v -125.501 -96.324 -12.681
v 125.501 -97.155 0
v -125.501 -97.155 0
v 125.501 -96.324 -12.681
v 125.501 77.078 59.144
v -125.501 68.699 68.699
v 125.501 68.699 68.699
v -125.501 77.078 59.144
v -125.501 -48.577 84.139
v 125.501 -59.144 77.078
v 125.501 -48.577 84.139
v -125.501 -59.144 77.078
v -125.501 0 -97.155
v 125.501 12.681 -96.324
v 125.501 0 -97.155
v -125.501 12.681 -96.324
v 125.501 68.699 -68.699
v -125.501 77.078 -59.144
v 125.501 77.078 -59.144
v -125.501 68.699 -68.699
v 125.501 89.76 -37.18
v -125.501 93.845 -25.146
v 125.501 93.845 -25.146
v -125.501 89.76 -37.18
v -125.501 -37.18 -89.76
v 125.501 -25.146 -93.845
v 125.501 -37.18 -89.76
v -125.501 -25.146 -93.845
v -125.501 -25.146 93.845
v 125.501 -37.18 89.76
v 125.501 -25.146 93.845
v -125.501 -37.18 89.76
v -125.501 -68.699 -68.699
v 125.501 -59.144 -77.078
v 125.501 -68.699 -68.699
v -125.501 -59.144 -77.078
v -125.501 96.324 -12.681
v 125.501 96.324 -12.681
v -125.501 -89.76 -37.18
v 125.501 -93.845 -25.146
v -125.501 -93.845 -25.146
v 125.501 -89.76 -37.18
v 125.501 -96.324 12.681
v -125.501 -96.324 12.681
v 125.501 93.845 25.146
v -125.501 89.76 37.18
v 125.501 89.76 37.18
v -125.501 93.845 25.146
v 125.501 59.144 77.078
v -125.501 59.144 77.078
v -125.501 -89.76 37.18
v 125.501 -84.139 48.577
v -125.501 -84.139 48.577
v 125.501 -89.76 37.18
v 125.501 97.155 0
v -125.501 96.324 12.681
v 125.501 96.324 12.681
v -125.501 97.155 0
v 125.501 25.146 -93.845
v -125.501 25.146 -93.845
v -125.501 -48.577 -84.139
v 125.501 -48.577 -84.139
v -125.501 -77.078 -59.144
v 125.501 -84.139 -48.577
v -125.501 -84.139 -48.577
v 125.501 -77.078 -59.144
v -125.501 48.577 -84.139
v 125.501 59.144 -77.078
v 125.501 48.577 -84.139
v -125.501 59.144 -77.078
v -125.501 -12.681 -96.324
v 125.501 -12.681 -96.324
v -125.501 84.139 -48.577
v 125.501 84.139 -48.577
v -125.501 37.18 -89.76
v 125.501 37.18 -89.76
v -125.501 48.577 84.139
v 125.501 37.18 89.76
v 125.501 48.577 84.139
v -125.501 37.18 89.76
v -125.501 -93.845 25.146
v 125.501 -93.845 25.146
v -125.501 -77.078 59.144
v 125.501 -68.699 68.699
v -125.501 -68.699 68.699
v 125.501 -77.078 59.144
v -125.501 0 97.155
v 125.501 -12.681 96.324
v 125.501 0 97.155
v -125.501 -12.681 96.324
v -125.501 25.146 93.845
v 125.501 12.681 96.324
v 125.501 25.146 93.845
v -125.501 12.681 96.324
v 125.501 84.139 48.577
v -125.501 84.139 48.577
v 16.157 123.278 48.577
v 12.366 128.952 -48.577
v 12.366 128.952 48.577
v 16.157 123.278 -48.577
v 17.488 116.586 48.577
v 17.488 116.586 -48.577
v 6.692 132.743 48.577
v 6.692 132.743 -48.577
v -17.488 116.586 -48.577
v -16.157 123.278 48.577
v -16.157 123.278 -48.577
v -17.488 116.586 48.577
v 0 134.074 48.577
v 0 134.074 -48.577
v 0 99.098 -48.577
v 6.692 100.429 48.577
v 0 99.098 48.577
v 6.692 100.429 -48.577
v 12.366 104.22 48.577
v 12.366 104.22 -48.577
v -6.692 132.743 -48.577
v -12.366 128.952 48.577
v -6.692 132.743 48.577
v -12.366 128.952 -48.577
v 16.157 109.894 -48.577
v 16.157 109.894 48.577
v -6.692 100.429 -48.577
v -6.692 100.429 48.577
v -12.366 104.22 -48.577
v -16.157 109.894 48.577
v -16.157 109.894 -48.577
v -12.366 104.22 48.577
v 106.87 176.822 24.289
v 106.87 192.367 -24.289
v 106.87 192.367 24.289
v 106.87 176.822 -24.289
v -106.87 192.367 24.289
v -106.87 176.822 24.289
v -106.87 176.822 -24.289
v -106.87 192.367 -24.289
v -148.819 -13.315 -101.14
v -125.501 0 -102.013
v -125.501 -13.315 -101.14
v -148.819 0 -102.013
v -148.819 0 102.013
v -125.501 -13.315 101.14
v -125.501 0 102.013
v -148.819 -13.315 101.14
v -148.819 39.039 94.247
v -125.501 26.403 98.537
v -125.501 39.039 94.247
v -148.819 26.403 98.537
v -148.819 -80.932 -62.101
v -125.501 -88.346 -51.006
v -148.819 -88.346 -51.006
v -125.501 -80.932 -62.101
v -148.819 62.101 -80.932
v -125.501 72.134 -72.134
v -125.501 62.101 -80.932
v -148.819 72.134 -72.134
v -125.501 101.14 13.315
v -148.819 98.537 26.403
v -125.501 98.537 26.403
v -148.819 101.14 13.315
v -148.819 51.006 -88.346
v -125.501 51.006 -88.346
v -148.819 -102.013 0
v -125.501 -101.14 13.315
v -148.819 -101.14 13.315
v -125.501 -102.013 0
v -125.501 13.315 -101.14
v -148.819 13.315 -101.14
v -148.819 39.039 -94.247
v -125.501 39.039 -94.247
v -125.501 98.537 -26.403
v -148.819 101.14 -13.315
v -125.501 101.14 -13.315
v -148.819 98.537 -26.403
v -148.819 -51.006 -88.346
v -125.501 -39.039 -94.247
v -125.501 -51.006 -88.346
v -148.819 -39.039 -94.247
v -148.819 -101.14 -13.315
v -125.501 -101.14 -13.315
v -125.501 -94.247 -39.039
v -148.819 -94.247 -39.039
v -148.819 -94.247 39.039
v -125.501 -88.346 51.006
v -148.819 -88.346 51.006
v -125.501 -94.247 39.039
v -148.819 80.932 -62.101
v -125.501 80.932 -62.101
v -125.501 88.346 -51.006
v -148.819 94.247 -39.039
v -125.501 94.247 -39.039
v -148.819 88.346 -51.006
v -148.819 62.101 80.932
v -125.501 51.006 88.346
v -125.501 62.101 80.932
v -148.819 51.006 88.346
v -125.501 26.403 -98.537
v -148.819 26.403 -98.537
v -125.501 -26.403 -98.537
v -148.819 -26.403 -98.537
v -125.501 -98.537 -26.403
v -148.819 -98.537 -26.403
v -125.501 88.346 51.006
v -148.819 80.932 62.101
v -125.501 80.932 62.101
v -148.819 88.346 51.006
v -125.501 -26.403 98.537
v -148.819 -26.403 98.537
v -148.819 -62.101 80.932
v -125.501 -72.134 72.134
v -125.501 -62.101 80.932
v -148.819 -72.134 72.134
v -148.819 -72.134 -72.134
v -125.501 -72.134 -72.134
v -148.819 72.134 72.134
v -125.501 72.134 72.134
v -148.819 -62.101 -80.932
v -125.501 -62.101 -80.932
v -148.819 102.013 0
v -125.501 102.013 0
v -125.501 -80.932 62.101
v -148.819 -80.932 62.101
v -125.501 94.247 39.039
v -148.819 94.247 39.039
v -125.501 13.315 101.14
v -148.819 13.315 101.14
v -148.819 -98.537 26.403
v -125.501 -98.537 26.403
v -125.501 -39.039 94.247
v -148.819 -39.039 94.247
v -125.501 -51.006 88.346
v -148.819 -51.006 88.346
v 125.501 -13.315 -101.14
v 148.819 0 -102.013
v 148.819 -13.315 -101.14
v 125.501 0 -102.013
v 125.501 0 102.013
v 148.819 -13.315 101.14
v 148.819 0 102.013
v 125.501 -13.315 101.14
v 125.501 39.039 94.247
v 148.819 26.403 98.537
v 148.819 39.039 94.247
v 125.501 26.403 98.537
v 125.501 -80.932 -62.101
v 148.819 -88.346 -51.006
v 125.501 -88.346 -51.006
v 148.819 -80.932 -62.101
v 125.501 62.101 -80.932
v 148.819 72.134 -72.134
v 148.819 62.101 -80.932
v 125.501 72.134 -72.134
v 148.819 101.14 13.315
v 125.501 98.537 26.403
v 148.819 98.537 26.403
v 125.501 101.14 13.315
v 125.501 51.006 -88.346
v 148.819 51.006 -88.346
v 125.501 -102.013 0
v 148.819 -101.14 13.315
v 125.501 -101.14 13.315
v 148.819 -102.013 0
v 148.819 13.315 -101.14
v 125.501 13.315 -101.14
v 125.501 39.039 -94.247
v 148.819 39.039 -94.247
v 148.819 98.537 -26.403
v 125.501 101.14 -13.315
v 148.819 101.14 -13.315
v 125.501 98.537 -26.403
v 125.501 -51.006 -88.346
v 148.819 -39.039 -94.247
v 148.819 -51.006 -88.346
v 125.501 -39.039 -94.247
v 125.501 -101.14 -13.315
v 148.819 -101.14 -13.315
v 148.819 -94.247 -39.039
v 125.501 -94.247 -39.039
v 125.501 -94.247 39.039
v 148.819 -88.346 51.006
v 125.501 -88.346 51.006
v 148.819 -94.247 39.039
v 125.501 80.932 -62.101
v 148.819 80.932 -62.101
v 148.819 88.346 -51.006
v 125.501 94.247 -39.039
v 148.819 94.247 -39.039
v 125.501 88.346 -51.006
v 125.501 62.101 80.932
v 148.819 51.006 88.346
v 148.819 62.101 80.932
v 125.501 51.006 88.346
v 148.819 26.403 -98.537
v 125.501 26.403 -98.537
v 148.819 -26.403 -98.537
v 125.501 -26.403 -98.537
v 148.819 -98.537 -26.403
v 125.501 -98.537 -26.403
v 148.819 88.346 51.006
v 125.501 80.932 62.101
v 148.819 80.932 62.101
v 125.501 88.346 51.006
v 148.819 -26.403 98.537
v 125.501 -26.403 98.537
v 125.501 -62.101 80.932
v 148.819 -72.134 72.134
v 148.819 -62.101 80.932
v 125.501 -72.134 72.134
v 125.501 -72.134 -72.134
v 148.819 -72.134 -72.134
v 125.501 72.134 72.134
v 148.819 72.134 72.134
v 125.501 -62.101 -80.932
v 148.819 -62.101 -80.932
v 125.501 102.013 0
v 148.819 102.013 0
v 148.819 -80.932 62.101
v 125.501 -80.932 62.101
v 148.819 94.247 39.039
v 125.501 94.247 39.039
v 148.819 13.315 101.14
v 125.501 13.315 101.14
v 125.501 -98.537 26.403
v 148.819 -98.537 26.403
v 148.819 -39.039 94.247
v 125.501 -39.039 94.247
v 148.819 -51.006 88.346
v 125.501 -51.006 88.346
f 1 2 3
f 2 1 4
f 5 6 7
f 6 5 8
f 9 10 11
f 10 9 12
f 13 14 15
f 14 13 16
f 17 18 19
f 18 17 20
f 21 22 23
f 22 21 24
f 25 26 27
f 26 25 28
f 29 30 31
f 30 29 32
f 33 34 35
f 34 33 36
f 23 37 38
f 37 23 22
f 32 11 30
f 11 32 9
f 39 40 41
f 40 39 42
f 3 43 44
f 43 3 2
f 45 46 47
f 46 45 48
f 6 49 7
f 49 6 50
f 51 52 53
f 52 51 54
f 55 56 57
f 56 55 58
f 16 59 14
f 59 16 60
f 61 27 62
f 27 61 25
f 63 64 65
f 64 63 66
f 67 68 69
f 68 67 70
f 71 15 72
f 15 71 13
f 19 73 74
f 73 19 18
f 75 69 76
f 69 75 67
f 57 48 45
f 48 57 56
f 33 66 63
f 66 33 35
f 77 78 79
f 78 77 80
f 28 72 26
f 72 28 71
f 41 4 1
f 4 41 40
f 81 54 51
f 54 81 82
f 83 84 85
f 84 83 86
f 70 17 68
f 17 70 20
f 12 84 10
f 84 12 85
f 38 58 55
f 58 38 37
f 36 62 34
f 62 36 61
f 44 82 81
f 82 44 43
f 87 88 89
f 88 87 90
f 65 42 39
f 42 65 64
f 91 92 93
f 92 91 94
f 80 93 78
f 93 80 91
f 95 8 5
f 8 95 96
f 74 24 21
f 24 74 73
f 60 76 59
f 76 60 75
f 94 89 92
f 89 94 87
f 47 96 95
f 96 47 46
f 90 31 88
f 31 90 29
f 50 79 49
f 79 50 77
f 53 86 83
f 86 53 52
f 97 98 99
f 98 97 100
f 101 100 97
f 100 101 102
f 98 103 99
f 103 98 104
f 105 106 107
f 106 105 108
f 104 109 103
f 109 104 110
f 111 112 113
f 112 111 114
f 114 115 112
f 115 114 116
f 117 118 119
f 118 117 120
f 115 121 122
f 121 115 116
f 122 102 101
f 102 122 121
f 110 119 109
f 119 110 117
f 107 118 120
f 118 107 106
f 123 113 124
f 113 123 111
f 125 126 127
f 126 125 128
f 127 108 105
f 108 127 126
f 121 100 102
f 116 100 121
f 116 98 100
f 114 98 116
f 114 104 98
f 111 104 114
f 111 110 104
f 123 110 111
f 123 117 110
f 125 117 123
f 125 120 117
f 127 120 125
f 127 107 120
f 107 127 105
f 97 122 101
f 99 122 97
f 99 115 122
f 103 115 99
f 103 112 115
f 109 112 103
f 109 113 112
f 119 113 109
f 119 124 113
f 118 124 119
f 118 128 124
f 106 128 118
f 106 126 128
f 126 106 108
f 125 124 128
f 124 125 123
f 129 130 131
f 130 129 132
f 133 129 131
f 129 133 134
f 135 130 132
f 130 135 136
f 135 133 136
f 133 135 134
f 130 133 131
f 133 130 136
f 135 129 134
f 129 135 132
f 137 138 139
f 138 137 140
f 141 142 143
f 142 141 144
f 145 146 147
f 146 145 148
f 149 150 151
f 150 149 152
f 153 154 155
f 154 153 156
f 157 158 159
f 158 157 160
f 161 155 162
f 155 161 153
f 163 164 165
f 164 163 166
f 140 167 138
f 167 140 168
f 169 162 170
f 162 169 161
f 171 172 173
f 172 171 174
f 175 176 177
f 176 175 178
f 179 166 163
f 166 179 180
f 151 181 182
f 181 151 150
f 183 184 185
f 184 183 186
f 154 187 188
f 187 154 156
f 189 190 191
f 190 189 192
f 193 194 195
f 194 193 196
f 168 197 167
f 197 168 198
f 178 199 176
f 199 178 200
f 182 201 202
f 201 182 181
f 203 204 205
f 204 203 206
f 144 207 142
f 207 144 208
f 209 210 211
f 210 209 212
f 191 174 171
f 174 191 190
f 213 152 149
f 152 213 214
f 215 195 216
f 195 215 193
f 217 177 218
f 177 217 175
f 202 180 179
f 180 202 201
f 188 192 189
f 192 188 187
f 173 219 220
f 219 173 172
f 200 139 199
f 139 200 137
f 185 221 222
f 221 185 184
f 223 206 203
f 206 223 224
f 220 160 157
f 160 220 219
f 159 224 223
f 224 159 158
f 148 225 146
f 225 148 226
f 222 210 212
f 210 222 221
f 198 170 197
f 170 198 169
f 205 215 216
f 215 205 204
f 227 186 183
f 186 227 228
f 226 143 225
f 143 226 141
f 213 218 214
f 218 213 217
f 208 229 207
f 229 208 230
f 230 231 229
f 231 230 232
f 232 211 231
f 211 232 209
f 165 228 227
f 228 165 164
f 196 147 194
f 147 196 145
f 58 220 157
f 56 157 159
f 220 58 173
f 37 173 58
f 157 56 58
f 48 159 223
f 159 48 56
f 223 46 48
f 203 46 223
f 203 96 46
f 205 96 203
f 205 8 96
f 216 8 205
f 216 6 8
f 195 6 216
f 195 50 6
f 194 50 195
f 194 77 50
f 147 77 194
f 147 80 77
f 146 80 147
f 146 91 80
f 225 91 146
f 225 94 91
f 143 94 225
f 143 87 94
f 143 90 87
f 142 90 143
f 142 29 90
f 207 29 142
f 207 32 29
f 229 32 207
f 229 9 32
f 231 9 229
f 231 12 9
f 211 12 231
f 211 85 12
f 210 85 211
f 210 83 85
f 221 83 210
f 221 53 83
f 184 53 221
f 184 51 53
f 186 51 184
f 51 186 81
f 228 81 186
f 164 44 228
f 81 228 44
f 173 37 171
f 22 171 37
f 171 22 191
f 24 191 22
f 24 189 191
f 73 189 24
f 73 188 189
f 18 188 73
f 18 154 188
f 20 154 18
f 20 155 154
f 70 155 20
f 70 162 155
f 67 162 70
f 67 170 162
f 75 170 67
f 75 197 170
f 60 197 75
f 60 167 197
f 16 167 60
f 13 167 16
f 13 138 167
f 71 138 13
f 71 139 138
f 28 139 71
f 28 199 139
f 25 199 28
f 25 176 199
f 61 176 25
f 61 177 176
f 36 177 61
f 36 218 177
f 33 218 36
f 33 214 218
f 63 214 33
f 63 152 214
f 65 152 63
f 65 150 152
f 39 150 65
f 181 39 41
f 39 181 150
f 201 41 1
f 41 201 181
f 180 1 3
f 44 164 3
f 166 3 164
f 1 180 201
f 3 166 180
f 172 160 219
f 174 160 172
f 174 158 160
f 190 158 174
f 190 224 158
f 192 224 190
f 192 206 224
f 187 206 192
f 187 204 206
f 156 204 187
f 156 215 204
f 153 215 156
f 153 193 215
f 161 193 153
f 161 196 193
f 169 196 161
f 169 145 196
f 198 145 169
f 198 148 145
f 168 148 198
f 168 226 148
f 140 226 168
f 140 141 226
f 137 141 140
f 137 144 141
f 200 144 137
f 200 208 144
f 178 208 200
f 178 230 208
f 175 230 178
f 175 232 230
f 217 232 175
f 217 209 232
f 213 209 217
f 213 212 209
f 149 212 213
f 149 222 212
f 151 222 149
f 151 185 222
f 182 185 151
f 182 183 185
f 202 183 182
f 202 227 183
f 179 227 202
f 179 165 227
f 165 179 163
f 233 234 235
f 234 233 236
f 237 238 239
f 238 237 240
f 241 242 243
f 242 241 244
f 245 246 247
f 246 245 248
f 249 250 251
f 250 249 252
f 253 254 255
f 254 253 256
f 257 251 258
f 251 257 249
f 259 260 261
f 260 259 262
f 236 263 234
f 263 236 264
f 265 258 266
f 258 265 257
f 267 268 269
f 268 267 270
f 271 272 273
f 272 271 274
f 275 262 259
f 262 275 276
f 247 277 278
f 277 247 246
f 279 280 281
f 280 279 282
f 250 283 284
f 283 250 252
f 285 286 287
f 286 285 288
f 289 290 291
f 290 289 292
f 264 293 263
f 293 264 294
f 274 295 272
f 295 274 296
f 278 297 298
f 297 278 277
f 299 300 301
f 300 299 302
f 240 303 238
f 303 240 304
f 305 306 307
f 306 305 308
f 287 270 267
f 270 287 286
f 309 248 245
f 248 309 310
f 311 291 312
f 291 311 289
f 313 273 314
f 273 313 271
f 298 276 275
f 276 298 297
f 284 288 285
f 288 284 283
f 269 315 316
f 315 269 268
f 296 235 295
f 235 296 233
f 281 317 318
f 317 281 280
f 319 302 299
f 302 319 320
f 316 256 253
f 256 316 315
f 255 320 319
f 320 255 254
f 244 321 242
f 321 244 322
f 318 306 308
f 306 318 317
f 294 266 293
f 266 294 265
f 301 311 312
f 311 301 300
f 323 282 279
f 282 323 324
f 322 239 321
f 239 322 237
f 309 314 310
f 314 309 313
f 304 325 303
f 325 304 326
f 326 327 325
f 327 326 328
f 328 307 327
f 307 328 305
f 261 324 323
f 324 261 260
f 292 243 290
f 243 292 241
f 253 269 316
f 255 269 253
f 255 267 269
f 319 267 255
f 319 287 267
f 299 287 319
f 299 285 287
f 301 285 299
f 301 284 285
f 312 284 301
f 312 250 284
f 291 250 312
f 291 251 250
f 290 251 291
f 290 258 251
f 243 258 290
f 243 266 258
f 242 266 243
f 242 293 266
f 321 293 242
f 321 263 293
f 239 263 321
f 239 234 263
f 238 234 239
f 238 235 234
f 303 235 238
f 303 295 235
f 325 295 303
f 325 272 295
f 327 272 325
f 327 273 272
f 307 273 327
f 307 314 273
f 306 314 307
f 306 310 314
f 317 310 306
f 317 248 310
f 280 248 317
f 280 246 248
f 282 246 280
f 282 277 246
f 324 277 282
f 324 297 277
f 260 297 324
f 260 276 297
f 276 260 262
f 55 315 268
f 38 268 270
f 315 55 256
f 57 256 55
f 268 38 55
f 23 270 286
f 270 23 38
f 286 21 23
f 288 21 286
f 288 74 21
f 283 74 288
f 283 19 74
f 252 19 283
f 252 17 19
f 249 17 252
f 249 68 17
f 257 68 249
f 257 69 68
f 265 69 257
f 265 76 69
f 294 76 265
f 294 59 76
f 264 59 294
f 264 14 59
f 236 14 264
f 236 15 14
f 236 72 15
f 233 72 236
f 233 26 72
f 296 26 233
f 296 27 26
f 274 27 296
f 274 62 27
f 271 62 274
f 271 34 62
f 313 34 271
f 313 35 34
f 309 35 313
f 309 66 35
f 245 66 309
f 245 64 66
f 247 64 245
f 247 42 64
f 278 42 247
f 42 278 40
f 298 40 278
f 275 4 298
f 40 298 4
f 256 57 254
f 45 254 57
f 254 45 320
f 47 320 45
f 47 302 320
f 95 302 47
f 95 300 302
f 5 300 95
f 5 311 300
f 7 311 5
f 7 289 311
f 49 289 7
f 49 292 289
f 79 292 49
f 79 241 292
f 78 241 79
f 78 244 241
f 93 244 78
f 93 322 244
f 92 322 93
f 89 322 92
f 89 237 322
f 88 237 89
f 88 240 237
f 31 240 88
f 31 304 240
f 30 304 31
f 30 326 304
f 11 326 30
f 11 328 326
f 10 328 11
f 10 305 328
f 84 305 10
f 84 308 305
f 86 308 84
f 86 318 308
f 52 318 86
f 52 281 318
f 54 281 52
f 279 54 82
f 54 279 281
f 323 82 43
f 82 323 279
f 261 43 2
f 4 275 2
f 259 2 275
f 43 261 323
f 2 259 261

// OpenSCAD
// Auto-generated by scripts/author_from_manifest.py (Phase D.3).
// Source: data/phase_d_manifest.json (sku_intent='tyco-av1-300-alarm-check-4in').
// Do not hand-edit — regenerate from the manifest.
//
// @part tyco_av1_300_alarm_check_4in
// @kind valve
// @category valve.alarm.check
// @display-name "Tyco AV-1-300 Alarm Check Valve 4\" (300 psi)"
// @mfg tyco_fire_protection
// @mfg-pn AV-1-300
// @listing UL FM
// @price-usd 540.00
// @install-minutes 45
// @crew foreman
// @param size_in number default=4 label="Size" unit="in"
// @port inlet position=[-0.05,0,0] direction=[-1,0,0] style=grooved size_in=4 role=run_a
// @port outlet position=[0.05,0,0] direction=[1,0,0] style=grooved size_in=4 role=run_b

size_in = 4.0;

function od_mm(nps) =
    nps ==   1  ? 33.4 :
    nps == 1.25 ? 42.2 :
    nps == 1.5  ? 48.3 :
    nps ==   2  ? 60.3 :
    nps == 2.5  ? 73.0 :
    nps ==   3  ? 88.9 :
    nps ==   4  ? 114.3 :
    nps ==   6  ? 168.3 :
    nps ==   8  ? 219.1 : 73.0;

od = od_mm(size_in);
body_len = od * 2.4;
body_d   = od * 1.7;

union() {
    // Valve body
    rotate([0, 90, 0])
        cylinder(h = body_len, d = body_d, center = true, $fn = 48);
    // Stem / handle indicator
    translate([0, body_d * 0.6, 0])
        cylinder(h = body_d * 0.5, d = body_d * 0.18, center = true, $fn = 16);
    translate([0, body_d * 0.95, 0])
        cube([body_d * 1.1, body_d * 0.08, body_d * 0.25], center = true);
    // End flanges
    translate([-body_len/2, 0, 0])
        rotate([0, 90, 0])
        cylinder(h = body_d * 0.12, d = body_d * 1.05, center = true, $fn = 48);
    translate([ body_len/2, 0, 0])
        rotate([0, 90, 0])
        cylinder(h = body_d * 0.12, d = body_d * 1.05, center = true, $fn = 48);
}
